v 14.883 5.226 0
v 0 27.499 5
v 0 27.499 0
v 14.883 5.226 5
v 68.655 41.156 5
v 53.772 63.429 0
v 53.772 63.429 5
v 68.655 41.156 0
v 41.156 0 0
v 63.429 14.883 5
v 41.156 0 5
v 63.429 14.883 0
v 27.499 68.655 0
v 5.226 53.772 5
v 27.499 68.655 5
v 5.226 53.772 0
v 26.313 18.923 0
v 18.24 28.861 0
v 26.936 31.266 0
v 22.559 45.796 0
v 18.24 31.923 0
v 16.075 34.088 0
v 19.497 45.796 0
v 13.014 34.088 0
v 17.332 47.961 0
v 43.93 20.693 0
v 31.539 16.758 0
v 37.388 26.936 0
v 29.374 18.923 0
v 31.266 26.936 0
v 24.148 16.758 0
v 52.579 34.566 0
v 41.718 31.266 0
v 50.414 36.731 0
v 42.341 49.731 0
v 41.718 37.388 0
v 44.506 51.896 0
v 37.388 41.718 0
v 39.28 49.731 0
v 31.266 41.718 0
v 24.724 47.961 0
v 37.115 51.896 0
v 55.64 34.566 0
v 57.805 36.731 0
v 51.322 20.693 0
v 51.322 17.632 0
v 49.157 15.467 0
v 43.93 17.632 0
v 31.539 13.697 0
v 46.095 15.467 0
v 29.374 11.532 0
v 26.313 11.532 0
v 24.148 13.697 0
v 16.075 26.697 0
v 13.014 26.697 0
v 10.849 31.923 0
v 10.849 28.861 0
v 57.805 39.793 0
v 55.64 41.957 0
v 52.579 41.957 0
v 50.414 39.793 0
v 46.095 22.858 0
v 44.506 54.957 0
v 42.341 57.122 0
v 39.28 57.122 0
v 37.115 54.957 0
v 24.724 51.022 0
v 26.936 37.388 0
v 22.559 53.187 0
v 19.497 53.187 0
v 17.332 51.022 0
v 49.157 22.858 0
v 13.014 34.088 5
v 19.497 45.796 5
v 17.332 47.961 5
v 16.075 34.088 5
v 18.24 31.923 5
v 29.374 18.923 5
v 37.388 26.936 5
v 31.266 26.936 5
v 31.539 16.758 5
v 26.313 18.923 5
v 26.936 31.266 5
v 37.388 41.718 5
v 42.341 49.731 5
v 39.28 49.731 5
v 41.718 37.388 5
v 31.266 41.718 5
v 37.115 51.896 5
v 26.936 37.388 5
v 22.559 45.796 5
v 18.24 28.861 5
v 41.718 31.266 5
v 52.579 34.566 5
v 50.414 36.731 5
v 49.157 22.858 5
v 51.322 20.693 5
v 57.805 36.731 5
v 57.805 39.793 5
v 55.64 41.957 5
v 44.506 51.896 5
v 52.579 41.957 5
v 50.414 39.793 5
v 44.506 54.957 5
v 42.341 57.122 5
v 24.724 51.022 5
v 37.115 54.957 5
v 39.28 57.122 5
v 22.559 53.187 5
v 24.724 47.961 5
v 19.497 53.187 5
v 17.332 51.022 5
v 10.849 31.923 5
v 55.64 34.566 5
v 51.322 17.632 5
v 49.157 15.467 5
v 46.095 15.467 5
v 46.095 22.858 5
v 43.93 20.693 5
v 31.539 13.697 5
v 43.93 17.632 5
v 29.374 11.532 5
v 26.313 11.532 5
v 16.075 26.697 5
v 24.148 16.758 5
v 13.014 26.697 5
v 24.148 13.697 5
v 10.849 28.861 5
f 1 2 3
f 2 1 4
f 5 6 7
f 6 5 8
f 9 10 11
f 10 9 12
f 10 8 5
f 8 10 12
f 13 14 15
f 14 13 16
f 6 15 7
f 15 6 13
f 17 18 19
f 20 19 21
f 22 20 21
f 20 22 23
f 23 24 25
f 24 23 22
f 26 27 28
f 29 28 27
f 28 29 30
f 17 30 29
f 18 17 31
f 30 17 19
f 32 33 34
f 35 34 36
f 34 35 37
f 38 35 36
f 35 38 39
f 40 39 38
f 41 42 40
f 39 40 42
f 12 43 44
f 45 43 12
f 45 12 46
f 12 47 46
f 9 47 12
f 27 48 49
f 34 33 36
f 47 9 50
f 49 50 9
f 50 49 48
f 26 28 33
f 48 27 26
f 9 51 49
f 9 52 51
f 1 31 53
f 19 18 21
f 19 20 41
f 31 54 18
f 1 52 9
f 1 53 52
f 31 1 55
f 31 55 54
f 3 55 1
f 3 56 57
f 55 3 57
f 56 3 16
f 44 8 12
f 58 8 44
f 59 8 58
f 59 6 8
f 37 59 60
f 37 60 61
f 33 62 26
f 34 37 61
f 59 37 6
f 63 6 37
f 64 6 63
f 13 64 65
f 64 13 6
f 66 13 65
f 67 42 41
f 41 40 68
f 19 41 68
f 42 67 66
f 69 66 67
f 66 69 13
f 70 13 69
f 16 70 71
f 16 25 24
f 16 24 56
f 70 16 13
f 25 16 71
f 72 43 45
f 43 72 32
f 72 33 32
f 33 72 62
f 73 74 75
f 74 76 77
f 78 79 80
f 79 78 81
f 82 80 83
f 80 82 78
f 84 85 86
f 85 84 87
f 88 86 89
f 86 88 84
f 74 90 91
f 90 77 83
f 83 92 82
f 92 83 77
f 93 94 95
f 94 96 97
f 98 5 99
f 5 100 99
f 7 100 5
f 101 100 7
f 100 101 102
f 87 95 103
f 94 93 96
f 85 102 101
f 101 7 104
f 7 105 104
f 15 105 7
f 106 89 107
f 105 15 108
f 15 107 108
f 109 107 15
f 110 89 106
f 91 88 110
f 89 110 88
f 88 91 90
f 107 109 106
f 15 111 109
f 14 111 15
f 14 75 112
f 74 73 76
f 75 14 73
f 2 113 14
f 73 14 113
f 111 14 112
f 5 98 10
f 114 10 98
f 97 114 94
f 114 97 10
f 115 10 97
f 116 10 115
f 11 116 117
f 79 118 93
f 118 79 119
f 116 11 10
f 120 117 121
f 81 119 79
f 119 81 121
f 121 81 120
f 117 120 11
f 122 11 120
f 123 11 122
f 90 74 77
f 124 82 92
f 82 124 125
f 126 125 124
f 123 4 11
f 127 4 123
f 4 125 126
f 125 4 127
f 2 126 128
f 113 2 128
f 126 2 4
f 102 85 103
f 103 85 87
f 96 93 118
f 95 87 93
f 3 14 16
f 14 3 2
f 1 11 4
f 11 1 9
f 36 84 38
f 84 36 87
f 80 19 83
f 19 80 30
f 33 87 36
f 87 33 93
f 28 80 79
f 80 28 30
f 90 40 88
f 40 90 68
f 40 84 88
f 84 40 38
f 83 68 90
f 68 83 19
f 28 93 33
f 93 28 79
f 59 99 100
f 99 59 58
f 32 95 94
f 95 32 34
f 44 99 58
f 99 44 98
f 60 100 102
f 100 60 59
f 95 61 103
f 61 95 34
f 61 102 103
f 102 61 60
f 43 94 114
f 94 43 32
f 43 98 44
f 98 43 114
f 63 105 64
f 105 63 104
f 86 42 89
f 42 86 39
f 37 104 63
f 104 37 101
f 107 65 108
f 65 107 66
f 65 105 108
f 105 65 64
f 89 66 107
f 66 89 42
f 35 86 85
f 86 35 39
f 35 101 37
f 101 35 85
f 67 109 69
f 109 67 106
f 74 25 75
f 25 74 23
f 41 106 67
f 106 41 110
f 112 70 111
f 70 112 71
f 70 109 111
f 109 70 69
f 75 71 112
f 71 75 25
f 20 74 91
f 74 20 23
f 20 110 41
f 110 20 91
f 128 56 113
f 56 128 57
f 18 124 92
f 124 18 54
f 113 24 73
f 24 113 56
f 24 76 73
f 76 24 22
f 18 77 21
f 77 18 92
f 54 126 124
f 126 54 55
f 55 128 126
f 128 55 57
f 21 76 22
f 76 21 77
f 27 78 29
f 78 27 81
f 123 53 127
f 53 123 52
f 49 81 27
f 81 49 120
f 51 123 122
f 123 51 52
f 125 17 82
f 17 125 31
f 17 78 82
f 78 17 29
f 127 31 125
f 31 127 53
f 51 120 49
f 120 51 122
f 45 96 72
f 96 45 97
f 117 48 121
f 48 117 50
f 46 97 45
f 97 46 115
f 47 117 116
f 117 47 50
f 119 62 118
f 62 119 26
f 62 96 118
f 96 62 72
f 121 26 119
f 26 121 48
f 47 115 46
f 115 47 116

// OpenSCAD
$fn = 32;

// ----------------------------------------------------------------------
// Polygon plate: 8-gon R35, 6 bolt windows
// ----------------------------------------------------------------------

// --- parameters (mm) ---
sides = 8;                // number of polygon sides
plate_r = 35;             // circumscribed radius of the polygon
bore_r = 8;               // centre bore radius
bolts = 6;                // number of bolt windows
ring_r = 20.17;           // bolt-circle radius
bolt_r = 4;               // bolt window radius
plate_t = 5;              // plate thickness, Z (extrusion height)

plate_d = 2 * plate_r;  // circumscribed diameter
bore_d = 2 * bore_r;  // centre bore diameter
bolt_d = 2 * bolt_r;  // bolt window diameter
ring_d = 2 * ring_r;  // bolt-circle diameter

profile = [[68.655, 41.156], [53.772, 63.429], [27.499, 68.655], [5.226, 53.772], [0, 27.499], [14.883, 5.226], [41.156, 0], [63.429, 14.883]];  // primary outline, 8 points, counter clockwise
void_1 = [[41.718, 37.388], [37.388, 41.718], [31.266, 41.718], [26.936, 37.388], [26.936, 31.266], [31.266, 26.936], [37.388, 26.936], [41.718, 31.266]];  // centre bore, 8 points
void_2 = [[57.805, 39.793], [55.64, 41.957], [52.579, 41.957], [50.414, 39.793], [50.414, 36.731], [52.579, 34.566], [55.64, 34.566], [57.805, 36.731]];  // bolt window 1, 8 points
void_3 = [[44.506, 54.957], [42.341, 57.122], [39.28, 57.122], [37.115, 54.957], [37.115, 51.896], [39.28, 49.731], [42.341, 49.731], [44.506, 51.896]];  // bolt window 2, 8 points
void_4 = [[24.724, 51.022], [22.559, 53.187], [19.497, 53.187], [17.332, 51.022], [17.332, 47.961], [19.497, 45.796], [22.559, 45.796], [24.724, 47.961]];  // bolt window 3, 8 points
void_5 = [[18.24, 31.923], [16.075, 34.088], [13.014, 34.088], [10.849, 31.923], [10.849, 28.861], [13.014, 26.697], [16.075, 26.697], [18.24, 28.861]];  // bolt window 4, 8 points
void_6 = [[31.539, 16.758], [29.374, 18.923], [26.313, 18.923], [24.148, 16.758], [24.148, 13.697], [26.313, 11.532], [29.374, 11.532], [31.539, 13.697]];  // bolt window 5, 8 points
void_7 = [[51.322, 20.693], [49.157, 22.858], [46.095, 22.858], [43.93, 20.693], [43.93, 17.632], [46.095, 15.467], [49.157, 15.467], [51.322, 17.632]];  // bolt window 6, 8 points

// --- the one profile operation ---
difference() {
  linear_extrude(height = plate_t) polygon(points = profile);
  translate([0, 0, -1])
    linear_extrude(height = plate_t + 2) polygon(points = void_1);
  translate([0, 0, -1])
    linear_extrude(height = plate_t + 2) polygon(points = void_2);
  translate([0, 0, -1])
    linear_extrude(height = plate_t + 2) polygon(points = void_3);
  translate([0, 0, -1])
    linear_extrude(height = plate_t + 2) polygon(points = void_4);
  translate([0, 0, -1])
    linear_extrude(height = plate_t + 2) polygon(points = void_5);
  translate([0, 0, -1])
    linear_extrude(height = plate_t + 2) polygon(points = void_6);
  translate([0, 0, -1])
    linear_extrude(height = plate_t + 2) polygon(points = void_7);
}
